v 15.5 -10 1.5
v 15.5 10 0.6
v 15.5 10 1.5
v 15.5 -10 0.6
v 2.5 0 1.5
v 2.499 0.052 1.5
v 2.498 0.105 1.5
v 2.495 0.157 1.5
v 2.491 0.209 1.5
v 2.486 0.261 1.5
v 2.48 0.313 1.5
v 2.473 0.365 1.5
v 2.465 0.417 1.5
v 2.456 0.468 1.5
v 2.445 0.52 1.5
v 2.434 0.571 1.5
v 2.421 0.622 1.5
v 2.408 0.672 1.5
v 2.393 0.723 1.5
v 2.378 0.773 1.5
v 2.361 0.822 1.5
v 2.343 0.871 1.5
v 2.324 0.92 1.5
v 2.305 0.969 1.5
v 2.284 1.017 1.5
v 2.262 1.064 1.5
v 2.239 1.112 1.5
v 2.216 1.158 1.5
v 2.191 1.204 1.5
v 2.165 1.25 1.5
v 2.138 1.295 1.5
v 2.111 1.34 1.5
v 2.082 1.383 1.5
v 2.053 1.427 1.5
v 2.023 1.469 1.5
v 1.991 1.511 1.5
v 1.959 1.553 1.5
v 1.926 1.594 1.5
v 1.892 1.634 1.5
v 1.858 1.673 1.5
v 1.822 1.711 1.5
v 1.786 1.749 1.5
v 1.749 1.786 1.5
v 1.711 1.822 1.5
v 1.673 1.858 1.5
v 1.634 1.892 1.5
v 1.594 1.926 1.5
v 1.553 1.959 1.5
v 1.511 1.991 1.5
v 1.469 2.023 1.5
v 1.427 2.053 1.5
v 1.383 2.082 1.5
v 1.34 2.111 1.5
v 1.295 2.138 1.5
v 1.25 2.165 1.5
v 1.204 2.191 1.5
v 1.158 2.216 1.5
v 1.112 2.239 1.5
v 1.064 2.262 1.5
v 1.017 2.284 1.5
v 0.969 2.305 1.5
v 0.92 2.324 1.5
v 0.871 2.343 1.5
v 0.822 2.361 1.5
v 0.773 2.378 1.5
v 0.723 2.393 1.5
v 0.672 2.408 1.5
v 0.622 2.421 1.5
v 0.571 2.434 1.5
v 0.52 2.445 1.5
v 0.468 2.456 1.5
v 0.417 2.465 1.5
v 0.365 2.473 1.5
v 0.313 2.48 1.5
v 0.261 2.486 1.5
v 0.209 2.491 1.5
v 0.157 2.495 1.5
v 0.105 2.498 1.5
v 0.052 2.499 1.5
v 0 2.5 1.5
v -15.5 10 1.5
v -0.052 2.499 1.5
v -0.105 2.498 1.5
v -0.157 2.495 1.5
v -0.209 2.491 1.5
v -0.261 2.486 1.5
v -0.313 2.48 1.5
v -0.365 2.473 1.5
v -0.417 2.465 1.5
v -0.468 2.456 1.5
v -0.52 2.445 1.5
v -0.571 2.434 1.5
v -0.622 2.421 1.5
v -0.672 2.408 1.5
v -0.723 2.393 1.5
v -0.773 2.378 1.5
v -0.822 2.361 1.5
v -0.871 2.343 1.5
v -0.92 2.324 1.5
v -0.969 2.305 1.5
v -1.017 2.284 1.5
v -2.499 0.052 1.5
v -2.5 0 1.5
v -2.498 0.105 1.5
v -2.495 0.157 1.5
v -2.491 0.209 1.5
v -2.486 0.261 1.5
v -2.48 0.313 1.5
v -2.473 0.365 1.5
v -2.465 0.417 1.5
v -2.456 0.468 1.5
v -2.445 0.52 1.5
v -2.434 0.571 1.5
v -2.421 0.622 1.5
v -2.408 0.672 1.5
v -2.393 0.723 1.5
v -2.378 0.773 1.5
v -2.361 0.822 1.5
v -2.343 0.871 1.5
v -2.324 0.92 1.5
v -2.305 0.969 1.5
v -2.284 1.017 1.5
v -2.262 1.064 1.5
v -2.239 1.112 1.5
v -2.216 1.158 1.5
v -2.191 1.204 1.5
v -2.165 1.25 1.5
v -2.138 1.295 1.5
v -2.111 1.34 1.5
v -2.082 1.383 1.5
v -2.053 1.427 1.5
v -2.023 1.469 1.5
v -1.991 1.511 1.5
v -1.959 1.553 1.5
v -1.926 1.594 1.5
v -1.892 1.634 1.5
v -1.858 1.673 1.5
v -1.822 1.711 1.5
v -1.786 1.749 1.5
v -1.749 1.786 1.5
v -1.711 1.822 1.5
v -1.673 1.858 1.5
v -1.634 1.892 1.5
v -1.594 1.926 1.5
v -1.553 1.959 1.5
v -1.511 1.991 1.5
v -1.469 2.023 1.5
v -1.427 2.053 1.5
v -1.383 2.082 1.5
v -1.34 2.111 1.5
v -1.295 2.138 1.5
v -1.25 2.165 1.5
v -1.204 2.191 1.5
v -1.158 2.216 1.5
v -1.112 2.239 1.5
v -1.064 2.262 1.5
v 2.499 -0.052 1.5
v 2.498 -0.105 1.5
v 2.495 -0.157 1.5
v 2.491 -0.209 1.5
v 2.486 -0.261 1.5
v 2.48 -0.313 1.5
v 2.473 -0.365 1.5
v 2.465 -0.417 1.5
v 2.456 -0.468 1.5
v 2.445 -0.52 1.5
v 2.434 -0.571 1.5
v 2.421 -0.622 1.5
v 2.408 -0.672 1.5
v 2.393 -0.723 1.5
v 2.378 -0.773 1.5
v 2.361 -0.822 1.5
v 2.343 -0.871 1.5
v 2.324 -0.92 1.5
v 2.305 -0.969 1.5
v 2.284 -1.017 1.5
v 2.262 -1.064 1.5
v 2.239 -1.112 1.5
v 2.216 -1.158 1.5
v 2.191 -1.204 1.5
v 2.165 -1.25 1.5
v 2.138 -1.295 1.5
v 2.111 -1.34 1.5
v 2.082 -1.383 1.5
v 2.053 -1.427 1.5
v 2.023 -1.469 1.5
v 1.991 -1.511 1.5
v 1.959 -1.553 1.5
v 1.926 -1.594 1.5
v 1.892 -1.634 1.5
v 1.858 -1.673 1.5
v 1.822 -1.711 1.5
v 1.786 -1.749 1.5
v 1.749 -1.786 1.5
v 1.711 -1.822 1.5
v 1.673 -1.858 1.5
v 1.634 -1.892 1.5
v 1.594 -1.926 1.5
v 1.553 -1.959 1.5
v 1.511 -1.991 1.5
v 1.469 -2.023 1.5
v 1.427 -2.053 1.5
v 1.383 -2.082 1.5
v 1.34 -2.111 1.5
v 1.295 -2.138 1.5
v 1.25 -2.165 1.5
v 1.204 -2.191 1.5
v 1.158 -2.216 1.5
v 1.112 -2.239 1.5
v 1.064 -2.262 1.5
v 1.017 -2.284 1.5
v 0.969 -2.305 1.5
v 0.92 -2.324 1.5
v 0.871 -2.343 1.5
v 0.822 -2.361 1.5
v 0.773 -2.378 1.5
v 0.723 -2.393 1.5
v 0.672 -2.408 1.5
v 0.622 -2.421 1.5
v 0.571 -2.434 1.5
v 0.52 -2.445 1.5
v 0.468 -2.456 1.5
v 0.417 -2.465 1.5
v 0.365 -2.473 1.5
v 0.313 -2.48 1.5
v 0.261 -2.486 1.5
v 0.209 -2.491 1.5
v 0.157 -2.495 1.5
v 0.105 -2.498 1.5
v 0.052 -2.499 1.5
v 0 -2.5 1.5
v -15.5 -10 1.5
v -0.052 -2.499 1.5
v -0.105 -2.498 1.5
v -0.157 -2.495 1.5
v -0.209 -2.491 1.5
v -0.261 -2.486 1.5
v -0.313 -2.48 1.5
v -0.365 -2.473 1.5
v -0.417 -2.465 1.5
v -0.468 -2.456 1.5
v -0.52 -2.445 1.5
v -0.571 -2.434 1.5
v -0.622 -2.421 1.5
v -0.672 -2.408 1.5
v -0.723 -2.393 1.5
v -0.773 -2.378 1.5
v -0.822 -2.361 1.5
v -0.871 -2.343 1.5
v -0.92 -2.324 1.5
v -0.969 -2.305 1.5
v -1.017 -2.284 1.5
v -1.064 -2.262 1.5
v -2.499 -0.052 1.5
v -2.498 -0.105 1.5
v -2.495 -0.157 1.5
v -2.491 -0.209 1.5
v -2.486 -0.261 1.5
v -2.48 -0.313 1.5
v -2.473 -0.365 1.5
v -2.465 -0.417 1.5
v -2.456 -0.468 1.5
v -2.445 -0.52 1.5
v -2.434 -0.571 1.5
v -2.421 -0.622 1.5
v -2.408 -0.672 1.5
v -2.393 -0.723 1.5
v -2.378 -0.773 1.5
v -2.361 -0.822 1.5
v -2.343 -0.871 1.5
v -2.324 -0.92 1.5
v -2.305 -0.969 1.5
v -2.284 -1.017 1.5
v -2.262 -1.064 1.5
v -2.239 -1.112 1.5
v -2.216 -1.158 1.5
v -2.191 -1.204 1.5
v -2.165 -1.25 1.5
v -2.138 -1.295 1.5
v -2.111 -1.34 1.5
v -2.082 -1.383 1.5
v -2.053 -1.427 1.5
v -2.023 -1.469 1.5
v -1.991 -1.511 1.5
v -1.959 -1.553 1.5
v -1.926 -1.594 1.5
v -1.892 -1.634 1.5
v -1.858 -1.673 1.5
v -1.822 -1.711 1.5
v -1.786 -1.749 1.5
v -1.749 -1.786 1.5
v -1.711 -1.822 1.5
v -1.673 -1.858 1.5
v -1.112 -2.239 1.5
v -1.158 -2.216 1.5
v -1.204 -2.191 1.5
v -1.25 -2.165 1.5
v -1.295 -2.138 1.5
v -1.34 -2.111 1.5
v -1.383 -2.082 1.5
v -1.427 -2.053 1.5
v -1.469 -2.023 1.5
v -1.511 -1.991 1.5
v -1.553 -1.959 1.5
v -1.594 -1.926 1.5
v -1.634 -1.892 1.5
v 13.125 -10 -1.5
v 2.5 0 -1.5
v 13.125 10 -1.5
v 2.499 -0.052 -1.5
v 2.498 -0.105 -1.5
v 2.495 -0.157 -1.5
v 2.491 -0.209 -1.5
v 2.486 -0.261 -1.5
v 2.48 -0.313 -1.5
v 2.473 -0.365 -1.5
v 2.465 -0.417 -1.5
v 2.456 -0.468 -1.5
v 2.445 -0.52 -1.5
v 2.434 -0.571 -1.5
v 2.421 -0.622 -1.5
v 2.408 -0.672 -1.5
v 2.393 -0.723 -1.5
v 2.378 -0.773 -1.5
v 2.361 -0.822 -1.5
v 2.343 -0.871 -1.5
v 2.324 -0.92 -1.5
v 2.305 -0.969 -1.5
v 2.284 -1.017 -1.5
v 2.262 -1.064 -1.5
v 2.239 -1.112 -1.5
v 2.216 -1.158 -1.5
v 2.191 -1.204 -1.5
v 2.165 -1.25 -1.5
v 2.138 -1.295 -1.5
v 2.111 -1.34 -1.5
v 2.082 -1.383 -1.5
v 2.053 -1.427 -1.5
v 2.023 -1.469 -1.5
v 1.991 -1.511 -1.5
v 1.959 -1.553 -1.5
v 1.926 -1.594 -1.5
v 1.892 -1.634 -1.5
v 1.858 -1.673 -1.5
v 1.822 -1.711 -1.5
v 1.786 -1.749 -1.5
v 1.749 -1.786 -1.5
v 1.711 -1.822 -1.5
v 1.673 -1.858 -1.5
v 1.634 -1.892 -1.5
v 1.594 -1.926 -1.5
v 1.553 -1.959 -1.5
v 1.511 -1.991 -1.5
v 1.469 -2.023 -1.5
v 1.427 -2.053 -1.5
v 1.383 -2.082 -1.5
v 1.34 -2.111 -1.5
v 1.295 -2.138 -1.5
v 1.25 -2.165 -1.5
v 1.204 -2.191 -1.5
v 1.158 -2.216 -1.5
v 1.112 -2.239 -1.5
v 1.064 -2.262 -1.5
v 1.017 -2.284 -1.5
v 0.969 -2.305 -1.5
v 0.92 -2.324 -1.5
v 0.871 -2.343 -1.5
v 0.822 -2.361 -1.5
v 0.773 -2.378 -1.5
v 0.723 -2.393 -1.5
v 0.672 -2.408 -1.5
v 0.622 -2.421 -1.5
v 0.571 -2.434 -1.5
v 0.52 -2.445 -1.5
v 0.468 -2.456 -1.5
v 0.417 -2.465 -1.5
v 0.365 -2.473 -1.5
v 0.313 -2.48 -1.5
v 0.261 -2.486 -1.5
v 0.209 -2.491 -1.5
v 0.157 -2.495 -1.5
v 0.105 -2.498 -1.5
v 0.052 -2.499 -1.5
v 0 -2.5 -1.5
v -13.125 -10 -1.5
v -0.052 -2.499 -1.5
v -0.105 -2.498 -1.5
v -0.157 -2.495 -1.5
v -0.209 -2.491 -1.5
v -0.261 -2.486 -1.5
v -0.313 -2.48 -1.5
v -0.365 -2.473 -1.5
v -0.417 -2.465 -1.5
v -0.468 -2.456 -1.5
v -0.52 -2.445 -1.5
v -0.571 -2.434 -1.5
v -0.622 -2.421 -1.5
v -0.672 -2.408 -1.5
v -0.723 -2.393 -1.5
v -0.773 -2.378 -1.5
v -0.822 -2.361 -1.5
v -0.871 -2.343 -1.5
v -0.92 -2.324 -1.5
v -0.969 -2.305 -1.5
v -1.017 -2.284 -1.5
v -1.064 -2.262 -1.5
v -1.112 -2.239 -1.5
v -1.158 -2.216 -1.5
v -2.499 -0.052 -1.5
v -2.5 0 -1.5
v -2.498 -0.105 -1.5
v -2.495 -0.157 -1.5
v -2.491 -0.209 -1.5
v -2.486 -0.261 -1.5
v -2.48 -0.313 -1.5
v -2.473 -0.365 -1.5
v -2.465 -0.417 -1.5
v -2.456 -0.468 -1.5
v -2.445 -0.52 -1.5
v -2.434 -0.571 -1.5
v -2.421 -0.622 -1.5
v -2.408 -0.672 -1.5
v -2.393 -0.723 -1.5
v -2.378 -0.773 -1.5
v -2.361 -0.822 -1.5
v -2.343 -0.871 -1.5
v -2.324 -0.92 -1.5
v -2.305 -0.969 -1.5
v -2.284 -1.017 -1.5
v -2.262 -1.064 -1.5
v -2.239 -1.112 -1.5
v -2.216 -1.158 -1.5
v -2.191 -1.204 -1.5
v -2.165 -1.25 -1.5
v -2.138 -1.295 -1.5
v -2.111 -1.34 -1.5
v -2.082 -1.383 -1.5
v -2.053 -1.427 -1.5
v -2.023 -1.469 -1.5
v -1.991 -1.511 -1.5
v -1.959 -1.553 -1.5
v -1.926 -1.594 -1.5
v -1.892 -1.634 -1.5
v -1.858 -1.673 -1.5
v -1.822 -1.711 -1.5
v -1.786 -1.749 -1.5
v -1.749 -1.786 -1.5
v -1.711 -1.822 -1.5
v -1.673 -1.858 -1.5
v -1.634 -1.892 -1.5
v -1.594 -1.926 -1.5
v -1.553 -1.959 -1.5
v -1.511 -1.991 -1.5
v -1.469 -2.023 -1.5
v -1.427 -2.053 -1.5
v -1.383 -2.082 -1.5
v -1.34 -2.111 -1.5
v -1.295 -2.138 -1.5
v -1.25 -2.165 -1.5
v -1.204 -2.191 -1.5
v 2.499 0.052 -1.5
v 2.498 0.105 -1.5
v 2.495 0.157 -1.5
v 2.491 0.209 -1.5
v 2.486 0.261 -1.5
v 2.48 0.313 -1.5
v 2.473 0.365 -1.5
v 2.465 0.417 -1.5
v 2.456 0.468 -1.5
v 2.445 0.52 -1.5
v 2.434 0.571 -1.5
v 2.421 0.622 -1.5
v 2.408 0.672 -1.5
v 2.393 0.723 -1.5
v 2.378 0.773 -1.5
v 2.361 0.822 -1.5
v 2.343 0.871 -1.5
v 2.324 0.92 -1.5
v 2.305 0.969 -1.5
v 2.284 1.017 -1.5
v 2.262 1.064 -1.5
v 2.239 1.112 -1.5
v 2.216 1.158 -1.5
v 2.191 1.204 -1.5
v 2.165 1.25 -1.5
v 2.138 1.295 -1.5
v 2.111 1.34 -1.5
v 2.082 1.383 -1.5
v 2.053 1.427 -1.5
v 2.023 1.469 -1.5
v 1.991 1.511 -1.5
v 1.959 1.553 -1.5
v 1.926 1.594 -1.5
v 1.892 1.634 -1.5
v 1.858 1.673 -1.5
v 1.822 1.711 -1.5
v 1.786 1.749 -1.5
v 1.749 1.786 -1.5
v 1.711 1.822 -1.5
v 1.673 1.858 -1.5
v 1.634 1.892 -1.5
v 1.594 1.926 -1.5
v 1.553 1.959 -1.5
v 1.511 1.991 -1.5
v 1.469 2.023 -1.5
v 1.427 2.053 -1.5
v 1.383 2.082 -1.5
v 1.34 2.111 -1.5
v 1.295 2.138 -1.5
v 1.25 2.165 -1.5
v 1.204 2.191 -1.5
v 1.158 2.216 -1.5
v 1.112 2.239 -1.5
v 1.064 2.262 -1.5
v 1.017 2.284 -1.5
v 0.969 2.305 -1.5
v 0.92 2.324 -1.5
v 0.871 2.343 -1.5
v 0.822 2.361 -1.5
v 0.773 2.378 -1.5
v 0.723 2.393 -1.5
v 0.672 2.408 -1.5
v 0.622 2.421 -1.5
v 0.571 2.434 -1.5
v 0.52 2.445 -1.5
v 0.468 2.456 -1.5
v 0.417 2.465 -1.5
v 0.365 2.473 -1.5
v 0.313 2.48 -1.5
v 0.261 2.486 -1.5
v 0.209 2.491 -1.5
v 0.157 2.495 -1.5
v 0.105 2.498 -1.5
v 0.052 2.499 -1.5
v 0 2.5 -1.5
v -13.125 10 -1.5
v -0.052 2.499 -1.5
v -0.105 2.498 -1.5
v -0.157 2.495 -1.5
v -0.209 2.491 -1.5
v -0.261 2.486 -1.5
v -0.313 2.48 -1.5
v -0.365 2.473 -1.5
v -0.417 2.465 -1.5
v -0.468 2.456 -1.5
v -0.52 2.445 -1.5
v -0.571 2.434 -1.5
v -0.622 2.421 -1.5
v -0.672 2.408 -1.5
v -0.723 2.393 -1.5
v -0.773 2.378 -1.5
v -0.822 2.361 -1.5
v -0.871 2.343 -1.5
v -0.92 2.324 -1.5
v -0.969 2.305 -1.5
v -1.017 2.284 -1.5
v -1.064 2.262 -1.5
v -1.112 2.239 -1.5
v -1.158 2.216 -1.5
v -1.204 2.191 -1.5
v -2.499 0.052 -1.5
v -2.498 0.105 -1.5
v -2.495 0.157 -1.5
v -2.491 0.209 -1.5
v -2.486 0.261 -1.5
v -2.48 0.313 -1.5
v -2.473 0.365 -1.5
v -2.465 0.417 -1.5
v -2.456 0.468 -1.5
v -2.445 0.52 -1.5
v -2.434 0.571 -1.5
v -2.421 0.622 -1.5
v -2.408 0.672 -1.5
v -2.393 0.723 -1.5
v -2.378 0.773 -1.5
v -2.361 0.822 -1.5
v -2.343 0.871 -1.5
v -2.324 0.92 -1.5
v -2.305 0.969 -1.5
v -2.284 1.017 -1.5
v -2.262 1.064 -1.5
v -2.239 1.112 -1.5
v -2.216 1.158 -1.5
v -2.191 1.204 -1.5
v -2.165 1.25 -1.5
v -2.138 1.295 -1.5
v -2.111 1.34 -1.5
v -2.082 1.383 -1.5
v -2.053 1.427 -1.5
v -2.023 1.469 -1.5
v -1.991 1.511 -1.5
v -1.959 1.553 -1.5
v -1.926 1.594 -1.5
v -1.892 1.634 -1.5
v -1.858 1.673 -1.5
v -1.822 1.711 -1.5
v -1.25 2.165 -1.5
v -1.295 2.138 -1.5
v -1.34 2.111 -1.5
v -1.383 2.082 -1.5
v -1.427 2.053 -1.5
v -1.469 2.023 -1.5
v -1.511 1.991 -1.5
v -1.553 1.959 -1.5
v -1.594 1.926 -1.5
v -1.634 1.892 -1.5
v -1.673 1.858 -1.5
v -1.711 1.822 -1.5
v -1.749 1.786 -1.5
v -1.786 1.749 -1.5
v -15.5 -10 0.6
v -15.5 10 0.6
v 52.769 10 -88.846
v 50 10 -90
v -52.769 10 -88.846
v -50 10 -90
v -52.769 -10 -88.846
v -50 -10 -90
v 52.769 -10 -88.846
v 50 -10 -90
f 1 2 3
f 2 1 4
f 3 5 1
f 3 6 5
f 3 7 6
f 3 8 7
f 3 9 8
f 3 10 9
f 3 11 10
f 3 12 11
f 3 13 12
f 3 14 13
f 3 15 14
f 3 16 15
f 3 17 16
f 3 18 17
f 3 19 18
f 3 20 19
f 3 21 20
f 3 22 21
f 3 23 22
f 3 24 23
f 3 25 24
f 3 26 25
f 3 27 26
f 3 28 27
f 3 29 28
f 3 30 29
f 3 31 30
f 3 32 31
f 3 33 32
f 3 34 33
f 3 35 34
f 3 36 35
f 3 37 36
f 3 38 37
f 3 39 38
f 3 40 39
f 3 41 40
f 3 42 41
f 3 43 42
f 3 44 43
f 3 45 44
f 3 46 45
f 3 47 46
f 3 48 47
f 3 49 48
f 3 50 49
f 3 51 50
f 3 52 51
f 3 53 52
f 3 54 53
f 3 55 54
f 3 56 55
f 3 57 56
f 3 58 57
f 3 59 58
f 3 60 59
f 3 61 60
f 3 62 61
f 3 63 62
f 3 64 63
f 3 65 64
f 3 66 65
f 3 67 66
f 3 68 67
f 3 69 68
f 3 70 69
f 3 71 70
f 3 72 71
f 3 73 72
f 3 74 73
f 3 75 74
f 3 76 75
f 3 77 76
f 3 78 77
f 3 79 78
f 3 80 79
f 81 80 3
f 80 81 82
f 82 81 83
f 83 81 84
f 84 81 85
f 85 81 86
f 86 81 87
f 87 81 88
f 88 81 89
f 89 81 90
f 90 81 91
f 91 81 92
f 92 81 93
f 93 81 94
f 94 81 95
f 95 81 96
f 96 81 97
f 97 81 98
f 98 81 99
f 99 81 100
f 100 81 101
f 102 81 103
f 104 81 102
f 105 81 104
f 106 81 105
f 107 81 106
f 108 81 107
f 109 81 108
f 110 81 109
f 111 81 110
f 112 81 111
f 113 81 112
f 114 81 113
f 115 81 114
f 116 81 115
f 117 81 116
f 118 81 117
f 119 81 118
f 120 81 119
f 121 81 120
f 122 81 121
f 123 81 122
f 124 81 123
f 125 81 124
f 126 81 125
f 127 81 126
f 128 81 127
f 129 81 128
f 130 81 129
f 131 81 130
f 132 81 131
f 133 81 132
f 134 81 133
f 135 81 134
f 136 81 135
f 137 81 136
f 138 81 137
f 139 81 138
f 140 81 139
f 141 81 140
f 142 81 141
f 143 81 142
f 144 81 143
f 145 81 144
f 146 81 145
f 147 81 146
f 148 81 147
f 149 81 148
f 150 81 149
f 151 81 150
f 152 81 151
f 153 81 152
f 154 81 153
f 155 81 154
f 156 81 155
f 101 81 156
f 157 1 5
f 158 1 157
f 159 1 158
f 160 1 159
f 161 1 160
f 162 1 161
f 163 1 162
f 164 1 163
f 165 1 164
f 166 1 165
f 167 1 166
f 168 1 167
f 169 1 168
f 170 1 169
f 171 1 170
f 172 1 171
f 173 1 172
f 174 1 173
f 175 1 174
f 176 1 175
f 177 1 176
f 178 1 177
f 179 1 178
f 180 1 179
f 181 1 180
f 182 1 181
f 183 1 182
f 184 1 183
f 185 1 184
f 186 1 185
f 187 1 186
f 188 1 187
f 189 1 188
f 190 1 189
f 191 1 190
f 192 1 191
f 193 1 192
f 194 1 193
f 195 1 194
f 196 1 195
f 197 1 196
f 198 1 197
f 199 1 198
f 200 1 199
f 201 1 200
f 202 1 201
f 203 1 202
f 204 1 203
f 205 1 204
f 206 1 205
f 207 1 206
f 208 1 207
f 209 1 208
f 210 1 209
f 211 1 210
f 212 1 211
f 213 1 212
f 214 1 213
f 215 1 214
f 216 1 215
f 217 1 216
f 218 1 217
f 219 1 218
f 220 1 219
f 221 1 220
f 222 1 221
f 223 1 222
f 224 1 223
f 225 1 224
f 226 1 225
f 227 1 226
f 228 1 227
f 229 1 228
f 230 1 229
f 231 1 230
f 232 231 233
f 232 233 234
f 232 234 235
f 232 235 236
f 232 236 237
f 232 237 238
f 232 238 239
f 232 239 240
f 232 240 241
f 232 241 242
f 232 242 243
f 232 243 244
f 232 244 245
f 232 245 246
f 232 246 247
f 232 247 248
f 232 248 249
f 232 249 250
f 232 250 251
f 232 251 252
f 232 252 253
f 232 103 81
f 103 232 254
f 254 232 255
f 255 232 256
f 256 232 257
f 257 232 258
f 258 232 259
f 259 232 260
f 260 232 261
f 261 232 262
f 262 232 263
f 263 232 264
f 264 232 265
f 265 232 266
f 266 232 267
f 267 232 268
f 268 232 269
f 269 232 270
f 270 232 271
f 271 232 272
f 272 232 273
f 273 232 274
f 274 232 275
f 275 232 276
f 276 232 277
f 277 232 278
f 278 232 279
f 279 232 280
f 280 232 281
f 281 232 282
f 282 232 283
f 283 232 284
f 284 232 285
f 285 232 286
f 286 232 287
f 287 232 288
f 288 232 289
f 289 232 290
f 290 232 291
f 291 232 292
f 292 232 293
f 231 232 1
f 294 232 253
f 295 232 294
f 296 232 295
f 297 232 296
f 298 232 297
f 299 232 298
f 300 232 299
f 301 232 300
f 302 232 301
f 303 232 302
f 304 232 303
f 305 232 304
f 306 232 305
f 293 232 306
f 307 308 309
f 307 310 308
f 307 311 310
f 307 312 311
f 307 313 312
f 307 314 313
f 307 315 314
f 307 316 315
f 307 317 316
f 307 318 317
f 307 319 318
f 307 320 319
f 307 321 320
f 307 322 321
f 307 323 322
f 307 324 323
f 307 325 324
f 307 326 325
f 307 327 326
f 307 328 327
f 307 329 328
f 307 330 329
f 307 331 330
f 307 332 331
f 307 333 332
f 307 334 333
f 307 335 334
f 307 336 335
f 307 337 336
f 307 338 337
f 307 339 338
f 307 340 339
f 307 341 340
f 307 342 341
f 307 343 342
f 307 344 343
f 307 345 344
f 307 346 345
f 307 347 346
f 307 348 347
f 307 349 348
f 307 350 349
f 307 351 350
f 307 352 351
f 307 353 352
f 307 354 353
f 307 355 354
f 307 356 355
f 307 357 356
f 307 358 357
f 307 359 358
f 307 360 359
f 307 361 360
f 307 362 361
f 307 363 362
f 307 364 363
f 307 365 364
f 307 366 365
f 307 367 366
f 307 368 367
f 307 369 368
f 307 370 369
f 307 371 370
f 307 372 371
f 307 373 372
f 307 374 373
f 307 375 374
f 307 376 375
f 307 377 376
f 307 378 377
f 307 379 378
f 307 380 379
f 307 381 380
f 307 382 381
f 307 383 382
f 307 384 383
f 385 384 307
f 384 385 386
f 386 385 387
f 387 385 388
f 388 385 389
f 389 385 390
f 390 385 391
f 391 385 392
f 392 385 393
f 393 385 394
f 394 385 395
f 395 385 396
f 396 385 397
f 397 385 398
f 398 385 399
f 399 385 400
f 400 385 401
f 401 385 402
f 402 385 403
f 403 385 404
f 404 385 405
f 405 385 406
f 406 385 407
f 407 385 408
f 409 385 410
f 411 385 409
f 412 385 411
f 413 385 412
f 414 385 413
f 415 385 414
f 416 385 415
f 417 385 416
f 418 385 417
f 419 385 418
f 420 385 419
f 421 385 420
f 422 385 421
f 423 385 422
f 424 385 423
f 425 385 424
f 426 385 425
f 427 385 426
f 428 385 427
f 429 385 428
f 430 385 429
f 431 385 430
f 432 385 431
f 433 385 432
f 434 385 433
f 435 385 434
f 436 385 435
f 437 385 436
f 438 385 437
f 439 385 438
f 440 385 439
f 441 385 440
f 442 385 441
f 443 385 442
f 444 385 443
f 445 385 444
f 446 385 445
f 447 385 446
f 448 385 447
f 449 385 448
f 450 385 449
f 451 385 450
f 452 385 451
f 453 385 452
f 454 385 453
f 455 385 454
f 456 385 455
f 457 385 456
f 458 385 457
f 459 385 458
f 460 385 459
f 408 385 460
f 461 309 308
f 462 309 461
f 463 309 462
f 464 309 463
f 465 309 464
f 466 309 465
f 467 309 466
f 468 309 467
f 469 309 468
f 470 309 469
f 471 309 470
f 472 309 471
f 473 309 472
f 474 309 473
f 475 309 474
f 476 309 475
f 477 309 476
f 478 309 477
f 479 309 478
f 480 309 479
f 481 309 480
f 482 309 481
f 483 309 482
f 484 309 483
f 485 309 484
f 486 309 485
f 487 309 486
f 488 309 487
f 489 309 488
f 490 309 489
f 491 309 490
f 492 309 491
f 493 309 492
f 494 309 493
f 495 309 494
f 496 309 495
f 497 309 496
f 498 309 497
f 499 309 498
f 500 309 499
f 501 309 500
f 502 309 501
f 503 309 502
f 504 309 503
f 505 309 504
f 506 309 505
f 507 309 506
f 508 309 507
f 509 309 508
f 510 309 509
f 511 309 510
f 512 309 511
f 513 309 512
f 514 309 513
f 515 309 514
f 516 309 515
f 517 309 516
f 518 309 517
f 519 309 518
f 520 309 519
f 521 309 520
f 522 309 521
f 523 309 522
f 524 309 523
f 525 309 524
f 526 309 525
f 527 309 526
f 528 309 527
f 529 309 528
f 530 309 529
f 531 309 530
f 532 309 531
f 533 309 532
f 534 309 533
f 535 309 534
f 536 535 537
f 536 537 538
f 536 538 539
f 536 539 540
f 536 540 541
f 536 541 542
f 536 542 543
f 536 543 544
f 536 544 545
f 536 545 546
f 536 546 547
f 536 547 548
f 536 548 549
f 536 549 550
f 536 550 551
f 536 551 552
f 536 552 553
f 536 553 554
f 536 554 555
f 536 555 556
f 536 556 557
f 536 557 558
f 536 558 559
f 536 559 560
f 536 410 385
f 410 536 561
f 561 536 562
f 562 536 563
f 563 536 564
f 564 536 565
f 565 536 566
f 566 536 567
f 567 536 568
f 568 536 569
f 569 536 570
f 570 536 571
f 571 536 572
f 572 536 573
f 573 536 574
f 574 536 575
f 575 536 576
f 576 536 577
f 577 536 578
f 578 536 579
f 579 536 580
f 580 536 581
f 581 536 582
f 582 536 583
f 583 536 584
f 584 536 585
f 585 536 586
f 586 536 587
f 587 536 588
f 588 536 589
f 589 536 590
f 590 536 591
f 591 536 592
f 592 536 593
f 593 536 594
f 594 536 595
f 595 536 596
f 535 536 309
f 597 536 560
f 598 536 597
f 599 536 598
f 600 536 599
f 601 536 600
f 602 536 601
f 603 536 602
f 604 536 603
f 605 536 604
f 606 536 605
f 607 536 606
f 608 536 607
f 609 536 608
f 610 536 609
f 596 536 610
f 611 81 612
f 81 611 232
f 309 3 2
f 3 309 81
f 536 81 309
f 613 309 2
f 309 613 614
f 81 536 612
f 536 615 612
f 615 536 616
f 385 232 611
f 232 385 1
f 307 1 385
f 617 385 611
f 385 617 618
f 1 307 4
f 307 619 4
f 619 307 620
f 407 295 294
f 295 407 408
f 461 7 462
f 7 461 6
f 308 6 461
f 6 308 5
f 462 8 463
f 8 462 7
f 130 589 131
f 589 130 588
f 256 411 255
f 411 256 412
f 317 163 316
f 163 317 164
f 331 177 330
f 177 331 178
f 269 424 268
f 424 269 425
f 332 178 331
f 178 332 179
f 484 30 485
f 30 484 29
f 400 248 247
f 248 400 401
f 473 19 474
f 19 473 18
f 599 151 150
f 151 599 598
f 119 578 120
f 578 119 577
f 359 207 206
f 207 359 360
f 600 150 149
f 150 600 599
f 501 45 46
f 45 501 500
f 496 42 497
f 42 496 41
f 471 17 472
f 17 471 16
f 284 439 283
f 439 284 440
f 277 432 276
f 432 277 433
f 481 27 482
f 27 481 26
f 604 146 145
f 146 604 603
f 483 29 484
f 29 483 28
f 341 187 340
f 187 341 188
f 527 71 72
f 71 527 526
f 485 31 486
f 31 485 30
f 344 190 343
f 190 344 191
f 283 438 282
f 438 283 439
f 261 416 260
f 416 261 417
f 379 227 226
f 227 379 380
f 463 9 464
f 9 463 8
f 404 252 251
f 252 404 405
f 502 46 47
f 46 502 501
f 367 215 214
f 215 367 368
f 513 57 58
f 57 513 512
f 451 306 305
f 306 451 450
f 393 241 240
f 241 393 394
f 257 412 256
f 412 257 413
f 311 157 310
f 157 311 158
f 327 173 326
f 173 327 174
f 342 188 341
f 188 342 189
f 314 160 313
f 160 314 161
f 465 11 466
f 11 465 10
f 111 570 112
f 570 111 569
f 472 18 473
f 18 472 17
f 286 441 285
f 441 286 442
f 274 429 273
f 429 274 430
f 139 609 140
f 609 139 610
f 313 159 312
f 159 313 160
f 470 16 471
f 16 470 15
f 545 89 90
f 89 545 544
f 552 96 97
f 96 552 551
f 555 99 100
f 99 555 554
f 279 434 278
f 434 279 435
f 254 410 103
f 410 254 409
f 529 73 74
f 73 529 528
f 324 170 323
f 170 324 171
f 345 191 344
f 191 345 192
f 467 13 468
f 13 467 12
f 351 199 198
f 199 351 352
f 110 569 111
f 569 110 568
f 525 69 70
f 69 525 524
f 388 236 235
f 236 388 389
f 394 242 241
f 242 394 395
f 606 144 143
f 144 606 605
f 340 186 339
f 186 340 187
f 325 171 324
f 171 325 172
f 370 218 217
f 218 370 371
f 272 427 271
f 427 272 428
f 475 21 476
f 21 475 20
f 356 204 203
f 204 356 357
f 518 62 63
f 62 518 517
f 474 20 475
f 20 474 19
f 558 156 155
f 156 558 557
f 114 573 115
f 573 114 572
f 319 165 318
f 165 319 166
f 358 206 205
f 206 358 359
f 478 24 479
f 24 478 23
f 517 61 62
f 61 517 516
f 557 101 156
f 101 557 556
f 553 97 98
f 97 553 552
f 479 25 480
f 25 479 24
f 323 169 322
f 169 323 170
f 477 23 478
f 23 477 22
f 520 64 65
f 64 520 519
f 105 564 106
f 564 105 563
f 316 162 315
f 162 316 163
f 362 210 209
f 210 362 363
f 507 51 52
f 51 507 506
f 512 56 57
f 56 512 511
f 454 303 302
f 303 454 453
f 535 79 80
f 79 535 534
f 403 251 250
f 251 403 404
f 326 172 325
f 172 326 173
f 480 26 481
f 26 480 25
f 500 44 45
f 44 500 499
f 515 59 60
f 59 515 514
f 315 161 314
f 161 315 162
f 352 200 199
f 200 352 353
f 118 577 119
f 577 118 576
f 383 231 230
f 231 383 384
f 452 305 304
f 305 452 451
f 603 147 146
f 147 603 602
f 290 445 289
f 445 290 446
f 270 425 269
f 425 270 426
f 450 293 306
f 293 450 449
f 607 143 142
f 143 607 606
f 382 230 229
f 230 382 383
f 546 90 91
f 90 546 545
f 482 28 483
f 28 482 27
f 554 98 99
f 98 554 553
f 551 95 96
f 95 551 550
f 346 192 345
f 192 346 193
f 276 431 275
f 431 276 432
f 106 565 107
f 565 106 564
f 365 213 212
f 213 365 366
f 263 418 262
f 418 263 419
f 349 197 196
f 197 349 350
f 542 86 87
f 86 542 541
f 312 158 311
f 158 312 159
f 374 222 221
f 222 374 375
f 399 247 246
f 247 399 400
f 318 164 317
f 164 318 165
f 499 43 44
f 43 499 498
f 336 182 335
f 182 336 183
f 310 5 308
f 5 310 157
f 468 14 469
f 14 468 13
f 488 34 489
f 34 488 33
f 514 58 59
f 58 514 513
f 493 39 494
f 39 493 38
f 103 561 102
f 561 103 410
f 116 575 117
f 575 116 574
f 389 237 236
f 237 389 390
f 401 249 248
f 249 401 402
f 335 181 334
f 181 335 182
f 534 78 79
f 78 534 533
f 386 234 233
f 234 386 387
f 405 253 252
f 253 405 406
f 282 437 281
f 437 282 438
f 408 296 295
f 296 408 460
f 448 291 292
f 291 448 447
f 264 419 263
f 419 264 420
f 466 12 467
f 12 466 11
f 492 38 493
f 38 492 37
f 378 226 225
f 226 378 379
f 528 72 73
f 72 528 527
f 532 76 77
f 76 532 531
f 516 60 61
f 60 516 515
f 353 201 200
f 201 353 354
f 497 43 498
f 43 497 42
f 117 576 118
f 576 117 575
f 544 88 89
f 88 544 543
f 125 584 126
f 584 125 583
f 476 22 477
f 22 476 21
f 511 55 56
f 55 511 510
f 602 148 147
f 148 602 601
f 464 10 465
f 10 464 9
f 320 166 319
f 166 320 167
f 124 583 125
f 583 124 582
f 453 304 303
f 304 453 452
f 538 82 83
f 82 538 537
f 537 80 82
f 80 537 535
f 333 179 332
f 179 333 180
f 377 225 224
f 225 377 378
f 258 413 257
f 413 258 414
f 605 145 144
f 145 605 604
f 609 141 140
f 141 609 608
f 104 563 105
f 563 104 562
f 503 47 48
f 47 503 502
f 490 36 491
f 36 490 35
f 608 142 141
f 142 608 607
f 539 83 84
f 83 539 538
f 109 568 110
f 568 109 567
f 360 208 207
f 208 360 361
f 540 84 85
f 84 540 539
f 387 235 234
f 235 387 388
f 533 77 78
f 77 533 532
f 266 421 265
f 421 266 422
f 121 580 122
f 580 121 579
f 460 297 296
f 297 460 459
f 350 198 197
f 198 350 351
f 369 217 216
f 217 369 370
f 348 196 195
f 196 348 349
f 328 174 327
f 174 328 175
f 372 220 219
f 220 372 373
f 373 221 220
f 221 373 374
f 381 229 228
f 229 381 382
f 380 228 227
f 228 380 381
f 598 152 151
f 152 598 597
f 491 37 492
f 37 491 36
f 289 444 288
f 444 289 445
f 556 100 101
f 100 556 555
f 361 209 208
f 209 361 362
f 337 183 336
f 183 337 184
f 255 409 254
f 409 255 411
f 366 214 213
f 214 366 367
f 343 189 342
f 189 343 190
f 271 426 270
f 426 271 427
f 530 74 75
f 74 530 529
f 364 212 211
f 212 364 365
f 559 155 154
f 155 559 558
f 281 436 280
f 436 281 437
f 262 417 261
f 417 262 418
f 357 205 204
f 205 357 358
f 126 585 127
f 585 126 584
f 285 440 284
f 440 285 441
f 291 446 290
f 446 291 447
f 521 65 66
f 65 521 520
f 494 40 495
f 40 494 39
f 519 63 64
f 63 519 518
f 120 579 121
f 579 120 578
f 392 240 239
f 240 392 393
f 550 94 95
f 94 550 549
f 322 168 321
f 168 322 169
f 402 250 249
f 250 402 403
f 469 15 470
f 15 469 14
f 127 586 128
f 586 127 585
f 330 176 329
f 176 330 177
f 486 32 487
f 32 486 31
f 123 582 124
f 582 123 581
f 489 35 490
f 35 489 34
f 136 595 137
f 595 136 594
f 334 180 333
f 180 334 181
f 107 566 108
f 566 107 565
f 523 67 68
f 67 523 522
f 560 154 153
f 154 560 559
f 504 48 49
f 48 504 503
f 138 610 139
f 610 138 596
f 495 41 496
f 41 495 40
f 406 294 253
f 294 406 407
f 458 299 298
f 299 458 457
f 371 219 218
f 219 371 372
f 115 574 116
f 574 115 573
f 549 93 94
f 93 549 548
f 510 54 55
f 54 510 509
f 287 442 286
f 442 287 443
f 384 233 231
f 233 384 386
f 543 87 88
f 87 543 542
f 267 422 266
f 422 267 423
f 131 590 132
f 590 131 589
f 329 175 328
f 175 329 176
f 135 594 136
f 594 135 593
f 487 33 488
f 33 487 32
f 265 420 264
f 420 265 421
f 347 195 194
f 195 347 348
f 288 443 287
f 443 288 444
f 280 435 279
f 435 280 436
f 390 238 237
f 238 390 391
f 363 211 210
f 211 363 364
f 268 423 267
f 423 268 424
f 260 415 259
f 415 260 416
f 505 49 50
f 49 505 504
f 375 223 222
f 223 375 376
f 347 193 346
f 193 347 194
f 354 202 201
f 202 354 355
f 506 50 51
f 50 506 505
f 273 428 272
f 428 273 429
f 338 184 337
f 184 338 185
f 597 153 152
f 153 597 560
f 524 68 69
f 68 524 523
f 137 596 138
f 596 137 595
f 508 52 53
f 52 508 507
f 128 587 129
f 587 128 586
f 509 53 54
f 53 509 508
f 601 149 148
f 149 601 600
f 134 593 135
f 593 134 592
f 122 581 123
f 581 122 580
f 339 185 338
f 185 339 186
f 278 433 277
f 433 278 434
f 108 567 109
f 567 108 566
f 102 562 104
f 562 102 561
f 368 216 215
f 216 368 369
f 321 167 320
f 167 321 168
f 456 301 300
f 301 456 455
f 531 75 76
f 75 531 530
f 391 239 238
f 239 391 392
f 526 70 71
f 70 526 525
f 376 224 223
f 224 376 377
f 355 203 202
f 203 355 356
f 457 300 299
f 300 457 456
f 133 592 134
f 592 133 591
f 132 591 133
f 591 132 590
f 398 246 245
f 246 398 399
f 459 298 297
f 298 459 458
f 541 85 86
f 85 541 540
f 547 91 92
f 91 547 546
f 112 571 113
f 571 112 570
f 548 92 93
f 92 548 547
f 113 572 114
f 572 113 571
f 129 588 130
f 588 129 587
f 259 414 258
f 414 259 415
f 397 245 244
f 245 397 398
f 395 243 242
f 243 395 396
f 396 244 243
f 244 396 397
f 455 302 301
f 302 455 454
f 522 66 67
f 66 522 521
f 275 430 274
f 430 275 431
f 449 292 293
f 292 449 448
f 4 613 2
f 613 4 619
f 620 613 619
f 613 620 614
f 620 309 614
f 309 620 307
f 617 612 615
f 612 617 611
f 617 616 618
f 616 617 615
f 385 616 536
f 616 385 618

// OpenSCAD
tol = 0.1;
cylinder_fragments = 300;
color_alpha = 0.9;

thickness = 3;
top = 25;
width = 20;

base = 100;
height = 90;
screw_diameter = 5;
leg_length = sqrt(height^2 + ((base-top)/2)^2);
leg_angle = 90 - acos(height / leg_length); // vertical leg has angle 90

difference(){
     union()
     {
          // leg in +x direction
          color("Blue", color_alpha)
               translate([top/2, 0, ])
               rotate([0, leg_angle, 0])
               translate([leg_length/2, 0, thickness/2])
               cube(size=[leg_length, width, thickness], center=true);
          
          // leg in -x direction
          color("Blue", color_alpha)
               rotate([0, 0, 180])
               translate([top/2, 0, ])
               rotate([0, leg_angle, 0])
               translate([leg_length/2, 0, thickness/2])
               cube(size=[leg_length, width, thickness], center=true);
          
          // top
          difference(){
               color("Red", color_alpha)
                    translate([0, 0, 0])
                    cube(size=[top+2*thickness, width, thickness], center=true);

               // screw hole
               color("Green", color_alpha)
                    cylinder(h=thickness+2*tol, d=screw_diameter, center=true, $fn=cylinder_fragments);
          }
     }
}
